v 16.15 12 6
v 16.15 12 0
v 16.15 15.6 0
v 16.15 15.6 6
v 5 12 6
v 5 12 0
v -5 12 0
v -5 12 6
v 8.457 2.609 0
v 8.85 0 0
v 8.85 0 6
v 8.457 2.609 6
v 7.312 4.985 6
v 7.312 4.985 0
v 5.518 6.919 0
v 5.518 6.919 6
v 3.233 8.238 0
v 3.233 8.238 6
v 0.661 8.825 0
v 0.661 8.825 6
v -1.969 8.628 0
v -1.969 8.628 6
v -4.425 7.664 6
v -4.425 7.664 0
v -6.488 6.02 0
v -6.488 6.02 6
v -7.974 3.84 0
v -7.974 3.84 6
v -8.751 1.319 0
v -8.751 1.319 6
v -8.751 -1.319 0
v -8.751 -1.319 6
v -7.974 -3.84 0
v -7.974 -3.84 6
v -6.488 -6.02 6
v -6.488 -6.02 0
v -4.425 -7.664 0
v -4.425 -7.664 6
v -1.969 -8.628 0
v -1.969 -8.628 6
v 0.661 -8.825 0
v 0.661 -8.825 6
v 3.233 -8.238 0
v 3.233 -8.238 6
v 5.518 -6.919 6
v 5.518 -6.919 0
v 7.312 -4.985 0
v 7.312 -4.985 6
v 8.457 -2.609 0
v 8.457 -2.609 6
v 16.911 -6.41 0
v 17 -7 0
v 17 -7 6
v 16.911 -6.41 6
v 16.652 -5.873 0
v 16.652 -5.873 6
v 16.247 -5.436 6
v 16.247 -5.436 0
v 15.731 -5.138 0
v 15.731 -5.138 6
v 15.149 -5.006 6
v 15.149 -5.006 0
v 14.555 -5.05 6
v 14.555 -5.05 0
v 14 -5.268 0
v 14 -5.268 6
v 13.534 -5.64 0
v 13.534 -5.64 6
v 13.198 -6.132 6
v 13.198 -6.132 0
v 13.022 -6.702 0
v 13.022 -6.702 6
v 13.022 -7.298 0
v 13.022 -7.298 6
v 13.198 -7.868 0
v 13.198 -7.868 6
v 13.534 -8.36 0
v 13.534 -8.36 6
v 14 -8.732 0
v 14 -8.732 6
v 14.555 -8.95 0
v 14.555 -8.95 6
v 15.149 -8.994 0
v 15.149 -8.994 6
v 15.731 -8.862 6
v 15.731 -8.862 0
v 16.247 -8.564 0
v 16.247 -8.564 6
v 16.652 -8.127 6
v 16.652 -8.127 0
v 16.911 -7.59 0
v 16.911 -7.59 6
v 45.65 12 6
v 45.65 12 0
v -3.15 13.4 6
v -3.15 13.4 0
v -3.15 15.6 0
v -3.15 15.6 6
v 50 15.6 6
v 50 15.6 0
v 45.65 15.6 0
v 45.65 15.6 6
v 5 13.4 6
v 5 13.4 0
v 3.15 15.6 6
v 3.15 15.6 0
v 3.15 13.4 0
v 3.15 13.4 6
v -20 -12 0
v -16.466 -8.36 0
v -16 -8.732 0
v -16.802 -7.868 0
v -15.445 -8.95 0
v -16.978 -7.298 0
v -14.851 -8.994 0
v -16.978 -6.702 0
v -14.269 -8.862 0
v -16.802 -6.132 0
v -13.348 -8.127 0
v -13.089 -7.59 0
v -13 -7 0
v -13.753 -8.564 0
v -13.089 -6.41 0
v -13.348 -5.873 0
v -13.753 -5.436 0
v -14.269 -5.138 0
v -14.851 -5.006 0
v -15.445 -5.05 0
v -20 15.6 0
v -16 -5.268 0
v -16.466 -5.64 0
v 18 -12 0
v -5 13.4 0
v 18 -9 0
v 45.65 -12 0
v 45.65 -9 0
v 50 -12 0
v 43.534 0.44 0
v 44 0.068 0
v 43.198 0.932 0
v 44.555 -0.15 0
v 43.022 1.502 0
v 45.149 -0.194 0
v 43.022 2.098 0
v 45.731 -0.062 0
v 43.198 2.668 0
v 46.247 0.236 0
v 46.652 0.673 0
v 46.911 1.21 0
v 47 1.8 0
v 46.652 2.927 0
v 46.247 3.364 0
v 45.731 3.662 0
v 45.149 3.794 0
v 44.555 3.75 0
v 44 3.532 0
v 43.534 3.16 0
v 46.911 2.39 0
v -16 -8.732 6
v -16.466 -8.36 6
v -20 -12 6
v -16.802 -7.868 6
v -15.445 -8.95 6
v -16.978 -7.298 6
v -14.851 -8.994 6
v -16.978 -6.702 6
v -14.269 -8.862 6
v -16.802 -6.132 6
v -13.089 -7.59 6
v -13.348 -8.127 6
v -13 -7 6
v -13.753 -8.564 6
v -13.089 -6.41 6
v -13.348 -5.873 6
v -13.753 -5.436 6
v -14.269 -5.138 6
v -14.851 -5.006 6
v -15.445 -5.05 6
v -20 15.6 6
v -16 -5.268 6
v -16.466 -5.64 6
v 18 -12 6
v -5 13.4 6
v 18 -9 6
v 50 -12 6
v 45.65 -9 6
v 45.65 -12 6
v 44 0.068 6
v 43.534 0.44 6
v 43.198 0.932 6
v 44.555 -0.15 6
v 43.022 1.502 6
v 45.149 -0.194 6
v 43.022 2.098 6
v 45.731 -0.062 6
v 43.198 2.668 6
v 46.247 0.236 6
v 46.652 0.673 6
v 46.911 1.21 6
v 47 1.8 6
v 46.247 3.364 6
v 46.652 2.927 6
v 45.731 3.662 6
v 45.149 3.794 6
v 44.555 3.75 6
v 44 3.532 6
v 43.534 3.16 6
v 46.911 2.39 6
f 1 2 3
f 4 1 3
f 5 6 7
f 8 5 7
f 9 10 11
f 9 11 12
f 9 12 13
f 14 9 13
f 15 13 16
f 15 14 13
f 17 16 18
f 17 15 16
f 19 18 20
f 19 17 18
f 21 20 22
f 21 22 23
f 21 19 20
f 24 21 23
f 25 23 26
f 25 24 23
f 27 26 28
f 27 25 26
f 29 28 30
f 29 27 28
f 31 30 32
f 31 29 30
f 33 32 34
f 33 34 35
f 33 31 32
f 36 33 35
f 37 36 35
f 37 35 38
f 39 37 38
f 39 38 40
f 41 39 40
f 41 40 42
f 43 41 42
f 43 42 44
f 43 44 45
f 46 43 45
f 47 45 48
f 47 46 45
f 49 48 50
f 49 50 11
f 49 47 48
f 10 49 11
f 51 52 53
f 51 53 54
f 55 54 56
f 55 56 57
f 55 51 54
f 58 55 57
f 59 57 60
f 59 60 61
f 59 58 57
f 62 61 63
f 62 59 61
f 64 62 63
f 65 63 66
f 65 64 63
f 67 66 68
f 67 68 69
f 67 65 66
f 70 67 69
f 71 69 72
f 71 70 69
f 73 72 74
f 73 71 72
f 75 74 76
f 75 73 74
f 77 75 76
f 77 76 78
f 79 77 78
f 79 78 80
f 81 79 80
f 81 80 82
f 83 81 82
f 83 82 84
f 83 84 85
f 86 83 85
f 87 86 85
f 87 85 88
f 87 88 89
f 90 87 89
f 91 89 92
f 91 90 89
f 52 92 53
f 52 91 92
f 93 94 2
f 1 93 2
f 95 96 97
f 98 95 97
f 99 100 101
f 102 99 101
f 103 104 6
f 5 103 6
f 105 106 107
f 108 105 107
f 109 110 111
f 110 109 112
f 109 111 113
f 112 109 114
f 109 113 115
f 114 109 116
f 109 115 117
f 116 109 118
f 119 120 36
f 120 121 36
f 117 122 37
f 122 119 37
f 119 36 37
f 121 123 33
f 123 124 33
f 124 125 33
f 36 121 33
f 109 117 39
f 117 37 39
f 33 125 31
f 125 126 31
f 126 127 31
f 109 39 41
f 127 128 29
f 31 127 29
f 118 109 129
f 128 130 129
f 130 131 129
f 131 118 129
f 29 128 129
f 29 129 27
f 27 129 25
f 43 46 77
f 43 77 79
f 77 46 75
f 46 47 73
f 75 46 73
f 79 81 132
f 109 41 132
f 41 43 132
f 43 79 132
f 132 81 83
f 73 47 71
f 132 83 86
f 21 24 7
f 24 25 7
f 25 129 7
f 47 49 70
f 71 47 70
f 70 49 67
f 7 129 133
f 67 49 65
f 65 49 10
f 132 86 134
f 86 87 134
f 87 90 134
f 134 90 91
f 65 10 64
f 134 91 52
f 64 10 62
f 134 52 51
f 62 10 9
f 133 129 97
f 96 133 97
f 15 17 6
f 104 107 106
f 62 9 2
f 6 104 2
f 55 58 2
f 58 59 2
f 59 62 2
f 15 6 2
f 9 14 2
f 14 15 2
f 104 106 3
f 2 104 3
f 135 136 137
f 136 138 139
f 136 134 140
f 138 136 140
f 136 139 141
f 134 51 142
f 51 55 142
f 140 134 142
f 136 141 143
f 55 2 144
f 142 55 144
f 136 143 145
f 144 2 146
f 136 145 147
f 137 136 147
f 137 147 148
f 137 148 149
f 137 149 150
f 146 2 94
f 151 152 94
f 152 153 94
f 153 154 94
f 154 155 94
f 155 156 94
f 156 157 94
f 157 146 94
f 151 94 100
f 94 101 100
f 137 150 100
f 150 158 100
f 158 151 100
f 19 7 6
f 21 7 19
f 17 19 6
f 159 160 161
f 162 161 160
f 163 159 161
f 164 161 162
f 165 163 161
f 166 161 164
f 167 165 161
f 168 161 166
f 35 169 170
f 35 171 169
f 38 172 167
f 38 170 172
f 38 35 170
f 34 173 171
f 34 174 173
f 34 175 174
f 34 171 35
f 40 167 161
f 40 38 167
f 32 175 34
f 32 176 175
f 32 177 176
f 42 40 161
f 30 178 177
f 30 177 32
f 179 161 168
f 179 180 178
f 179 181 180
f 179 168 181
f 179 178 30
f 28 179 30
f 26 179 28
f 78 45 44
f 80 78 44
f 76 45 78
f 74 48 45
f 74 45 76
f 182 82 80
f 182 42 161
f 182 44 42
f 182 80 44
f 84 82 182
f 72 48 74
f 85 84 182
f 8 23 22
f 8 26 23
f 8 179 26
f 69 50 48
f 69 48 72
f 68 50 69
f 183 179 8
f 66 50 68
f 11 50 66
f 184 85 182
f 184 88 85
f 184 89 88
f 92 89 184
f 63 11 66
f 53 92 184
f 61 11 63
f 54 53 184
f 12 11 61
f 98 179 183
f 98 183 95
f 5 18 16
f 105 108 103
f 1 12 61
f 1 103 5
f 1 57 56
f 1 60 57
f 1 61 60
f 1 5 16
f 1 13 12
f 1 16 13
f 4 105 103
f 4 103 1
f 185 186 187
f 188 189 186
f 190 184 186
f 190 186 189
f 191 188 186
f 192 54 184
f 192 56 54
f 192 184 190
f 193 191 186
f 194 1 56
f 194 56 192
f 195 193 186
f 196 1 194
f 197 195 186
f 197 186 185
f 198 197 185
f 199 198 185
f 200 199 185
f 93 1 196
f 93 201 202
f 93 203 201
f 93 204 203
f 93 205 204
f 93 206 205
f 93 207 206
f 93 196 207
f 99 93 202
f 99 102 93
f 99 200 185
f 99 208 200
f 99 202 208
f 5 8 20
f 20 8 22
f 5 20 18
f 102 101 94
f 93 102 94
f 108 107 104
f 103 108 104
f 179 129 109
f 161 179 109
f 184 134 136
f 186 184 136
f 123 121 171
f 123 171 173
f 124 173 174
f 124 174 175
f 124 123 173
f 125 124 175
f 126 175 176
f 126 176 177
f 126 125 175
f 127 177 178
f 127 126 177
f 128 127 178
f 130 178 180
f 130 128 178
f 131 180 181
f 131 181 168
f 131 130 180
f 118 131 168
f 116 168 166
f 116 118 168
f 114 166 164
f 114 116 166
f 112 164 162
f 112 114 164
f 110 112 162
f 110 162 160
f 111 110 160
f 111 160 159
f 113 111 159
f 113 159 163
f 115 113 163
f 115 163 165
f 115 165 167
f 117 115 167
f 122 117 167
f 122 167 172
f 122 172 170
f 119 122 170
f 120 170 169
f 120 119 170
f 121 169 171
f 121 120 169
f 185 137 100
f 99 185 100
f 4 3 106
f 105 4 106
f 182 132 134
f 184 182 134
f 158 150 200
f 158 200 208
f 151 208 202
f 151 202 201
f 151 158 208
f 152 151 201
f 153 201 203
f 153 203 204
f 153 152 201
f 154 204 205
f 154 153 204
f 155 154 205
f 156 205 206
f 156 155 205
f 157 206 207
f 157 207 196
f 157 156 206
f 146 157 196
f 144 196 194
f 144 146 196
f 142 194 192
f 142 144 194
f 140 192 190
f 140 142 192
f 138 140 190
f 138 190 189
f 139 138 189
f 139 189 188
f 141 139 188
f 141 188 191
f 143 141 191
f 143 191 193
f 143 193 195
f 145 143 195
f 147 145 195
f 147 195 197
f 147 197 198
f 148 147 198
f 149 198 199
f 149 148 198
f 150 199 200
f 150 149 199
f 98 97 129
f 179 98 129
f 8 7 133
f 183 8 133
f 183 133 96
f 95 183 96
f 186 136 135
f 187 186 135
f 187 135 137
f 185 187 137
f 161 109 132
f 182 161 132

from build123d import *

# Parameters (mm, degrees)
F0_R     = 2
F0_R_2   = 8.85
F1_DEPTH = 6


# Not quite as in the source:
# - a feature names something its author has since deleted; it is built from what else it names


with BuildPart() as f1:
    # F0 (on Top) → F1 (new body)
    with BuildSketch(Plane.XY):
        Polygon((-20, 15.6), (-20, 12), (-20, -12), (18, -12), (18, -9), (45.65, -9), (45.65, -12), (50, -12), (50, 15.6), (45.65, 15.6), (45.65, 12), (16.15, 12), (16.15, 15.6), (3.15, 15.6), (3.15, 13.4), (5, 13.4), (5, 12), (-5, 12), (-5, 13.4), (-3.15, 13.4), (-3.15, 15.6), align=None)
        with Locations((-15, -7)):
            Circle(F0_R, mode=Mode.SUBTRACT)
        Circle(F0_R_2, mode=Mode.SUBTRACT)
        with Locations((15, -7)):
            Circle(F0_R, mode=Mode.SUBTRACT)
        with Locations((45, 1.8)):
            Circle(F0_R, mode=Mode.SUBTRACT)
    extrude(amount=F1_DEPTH)


solid = f1.part
